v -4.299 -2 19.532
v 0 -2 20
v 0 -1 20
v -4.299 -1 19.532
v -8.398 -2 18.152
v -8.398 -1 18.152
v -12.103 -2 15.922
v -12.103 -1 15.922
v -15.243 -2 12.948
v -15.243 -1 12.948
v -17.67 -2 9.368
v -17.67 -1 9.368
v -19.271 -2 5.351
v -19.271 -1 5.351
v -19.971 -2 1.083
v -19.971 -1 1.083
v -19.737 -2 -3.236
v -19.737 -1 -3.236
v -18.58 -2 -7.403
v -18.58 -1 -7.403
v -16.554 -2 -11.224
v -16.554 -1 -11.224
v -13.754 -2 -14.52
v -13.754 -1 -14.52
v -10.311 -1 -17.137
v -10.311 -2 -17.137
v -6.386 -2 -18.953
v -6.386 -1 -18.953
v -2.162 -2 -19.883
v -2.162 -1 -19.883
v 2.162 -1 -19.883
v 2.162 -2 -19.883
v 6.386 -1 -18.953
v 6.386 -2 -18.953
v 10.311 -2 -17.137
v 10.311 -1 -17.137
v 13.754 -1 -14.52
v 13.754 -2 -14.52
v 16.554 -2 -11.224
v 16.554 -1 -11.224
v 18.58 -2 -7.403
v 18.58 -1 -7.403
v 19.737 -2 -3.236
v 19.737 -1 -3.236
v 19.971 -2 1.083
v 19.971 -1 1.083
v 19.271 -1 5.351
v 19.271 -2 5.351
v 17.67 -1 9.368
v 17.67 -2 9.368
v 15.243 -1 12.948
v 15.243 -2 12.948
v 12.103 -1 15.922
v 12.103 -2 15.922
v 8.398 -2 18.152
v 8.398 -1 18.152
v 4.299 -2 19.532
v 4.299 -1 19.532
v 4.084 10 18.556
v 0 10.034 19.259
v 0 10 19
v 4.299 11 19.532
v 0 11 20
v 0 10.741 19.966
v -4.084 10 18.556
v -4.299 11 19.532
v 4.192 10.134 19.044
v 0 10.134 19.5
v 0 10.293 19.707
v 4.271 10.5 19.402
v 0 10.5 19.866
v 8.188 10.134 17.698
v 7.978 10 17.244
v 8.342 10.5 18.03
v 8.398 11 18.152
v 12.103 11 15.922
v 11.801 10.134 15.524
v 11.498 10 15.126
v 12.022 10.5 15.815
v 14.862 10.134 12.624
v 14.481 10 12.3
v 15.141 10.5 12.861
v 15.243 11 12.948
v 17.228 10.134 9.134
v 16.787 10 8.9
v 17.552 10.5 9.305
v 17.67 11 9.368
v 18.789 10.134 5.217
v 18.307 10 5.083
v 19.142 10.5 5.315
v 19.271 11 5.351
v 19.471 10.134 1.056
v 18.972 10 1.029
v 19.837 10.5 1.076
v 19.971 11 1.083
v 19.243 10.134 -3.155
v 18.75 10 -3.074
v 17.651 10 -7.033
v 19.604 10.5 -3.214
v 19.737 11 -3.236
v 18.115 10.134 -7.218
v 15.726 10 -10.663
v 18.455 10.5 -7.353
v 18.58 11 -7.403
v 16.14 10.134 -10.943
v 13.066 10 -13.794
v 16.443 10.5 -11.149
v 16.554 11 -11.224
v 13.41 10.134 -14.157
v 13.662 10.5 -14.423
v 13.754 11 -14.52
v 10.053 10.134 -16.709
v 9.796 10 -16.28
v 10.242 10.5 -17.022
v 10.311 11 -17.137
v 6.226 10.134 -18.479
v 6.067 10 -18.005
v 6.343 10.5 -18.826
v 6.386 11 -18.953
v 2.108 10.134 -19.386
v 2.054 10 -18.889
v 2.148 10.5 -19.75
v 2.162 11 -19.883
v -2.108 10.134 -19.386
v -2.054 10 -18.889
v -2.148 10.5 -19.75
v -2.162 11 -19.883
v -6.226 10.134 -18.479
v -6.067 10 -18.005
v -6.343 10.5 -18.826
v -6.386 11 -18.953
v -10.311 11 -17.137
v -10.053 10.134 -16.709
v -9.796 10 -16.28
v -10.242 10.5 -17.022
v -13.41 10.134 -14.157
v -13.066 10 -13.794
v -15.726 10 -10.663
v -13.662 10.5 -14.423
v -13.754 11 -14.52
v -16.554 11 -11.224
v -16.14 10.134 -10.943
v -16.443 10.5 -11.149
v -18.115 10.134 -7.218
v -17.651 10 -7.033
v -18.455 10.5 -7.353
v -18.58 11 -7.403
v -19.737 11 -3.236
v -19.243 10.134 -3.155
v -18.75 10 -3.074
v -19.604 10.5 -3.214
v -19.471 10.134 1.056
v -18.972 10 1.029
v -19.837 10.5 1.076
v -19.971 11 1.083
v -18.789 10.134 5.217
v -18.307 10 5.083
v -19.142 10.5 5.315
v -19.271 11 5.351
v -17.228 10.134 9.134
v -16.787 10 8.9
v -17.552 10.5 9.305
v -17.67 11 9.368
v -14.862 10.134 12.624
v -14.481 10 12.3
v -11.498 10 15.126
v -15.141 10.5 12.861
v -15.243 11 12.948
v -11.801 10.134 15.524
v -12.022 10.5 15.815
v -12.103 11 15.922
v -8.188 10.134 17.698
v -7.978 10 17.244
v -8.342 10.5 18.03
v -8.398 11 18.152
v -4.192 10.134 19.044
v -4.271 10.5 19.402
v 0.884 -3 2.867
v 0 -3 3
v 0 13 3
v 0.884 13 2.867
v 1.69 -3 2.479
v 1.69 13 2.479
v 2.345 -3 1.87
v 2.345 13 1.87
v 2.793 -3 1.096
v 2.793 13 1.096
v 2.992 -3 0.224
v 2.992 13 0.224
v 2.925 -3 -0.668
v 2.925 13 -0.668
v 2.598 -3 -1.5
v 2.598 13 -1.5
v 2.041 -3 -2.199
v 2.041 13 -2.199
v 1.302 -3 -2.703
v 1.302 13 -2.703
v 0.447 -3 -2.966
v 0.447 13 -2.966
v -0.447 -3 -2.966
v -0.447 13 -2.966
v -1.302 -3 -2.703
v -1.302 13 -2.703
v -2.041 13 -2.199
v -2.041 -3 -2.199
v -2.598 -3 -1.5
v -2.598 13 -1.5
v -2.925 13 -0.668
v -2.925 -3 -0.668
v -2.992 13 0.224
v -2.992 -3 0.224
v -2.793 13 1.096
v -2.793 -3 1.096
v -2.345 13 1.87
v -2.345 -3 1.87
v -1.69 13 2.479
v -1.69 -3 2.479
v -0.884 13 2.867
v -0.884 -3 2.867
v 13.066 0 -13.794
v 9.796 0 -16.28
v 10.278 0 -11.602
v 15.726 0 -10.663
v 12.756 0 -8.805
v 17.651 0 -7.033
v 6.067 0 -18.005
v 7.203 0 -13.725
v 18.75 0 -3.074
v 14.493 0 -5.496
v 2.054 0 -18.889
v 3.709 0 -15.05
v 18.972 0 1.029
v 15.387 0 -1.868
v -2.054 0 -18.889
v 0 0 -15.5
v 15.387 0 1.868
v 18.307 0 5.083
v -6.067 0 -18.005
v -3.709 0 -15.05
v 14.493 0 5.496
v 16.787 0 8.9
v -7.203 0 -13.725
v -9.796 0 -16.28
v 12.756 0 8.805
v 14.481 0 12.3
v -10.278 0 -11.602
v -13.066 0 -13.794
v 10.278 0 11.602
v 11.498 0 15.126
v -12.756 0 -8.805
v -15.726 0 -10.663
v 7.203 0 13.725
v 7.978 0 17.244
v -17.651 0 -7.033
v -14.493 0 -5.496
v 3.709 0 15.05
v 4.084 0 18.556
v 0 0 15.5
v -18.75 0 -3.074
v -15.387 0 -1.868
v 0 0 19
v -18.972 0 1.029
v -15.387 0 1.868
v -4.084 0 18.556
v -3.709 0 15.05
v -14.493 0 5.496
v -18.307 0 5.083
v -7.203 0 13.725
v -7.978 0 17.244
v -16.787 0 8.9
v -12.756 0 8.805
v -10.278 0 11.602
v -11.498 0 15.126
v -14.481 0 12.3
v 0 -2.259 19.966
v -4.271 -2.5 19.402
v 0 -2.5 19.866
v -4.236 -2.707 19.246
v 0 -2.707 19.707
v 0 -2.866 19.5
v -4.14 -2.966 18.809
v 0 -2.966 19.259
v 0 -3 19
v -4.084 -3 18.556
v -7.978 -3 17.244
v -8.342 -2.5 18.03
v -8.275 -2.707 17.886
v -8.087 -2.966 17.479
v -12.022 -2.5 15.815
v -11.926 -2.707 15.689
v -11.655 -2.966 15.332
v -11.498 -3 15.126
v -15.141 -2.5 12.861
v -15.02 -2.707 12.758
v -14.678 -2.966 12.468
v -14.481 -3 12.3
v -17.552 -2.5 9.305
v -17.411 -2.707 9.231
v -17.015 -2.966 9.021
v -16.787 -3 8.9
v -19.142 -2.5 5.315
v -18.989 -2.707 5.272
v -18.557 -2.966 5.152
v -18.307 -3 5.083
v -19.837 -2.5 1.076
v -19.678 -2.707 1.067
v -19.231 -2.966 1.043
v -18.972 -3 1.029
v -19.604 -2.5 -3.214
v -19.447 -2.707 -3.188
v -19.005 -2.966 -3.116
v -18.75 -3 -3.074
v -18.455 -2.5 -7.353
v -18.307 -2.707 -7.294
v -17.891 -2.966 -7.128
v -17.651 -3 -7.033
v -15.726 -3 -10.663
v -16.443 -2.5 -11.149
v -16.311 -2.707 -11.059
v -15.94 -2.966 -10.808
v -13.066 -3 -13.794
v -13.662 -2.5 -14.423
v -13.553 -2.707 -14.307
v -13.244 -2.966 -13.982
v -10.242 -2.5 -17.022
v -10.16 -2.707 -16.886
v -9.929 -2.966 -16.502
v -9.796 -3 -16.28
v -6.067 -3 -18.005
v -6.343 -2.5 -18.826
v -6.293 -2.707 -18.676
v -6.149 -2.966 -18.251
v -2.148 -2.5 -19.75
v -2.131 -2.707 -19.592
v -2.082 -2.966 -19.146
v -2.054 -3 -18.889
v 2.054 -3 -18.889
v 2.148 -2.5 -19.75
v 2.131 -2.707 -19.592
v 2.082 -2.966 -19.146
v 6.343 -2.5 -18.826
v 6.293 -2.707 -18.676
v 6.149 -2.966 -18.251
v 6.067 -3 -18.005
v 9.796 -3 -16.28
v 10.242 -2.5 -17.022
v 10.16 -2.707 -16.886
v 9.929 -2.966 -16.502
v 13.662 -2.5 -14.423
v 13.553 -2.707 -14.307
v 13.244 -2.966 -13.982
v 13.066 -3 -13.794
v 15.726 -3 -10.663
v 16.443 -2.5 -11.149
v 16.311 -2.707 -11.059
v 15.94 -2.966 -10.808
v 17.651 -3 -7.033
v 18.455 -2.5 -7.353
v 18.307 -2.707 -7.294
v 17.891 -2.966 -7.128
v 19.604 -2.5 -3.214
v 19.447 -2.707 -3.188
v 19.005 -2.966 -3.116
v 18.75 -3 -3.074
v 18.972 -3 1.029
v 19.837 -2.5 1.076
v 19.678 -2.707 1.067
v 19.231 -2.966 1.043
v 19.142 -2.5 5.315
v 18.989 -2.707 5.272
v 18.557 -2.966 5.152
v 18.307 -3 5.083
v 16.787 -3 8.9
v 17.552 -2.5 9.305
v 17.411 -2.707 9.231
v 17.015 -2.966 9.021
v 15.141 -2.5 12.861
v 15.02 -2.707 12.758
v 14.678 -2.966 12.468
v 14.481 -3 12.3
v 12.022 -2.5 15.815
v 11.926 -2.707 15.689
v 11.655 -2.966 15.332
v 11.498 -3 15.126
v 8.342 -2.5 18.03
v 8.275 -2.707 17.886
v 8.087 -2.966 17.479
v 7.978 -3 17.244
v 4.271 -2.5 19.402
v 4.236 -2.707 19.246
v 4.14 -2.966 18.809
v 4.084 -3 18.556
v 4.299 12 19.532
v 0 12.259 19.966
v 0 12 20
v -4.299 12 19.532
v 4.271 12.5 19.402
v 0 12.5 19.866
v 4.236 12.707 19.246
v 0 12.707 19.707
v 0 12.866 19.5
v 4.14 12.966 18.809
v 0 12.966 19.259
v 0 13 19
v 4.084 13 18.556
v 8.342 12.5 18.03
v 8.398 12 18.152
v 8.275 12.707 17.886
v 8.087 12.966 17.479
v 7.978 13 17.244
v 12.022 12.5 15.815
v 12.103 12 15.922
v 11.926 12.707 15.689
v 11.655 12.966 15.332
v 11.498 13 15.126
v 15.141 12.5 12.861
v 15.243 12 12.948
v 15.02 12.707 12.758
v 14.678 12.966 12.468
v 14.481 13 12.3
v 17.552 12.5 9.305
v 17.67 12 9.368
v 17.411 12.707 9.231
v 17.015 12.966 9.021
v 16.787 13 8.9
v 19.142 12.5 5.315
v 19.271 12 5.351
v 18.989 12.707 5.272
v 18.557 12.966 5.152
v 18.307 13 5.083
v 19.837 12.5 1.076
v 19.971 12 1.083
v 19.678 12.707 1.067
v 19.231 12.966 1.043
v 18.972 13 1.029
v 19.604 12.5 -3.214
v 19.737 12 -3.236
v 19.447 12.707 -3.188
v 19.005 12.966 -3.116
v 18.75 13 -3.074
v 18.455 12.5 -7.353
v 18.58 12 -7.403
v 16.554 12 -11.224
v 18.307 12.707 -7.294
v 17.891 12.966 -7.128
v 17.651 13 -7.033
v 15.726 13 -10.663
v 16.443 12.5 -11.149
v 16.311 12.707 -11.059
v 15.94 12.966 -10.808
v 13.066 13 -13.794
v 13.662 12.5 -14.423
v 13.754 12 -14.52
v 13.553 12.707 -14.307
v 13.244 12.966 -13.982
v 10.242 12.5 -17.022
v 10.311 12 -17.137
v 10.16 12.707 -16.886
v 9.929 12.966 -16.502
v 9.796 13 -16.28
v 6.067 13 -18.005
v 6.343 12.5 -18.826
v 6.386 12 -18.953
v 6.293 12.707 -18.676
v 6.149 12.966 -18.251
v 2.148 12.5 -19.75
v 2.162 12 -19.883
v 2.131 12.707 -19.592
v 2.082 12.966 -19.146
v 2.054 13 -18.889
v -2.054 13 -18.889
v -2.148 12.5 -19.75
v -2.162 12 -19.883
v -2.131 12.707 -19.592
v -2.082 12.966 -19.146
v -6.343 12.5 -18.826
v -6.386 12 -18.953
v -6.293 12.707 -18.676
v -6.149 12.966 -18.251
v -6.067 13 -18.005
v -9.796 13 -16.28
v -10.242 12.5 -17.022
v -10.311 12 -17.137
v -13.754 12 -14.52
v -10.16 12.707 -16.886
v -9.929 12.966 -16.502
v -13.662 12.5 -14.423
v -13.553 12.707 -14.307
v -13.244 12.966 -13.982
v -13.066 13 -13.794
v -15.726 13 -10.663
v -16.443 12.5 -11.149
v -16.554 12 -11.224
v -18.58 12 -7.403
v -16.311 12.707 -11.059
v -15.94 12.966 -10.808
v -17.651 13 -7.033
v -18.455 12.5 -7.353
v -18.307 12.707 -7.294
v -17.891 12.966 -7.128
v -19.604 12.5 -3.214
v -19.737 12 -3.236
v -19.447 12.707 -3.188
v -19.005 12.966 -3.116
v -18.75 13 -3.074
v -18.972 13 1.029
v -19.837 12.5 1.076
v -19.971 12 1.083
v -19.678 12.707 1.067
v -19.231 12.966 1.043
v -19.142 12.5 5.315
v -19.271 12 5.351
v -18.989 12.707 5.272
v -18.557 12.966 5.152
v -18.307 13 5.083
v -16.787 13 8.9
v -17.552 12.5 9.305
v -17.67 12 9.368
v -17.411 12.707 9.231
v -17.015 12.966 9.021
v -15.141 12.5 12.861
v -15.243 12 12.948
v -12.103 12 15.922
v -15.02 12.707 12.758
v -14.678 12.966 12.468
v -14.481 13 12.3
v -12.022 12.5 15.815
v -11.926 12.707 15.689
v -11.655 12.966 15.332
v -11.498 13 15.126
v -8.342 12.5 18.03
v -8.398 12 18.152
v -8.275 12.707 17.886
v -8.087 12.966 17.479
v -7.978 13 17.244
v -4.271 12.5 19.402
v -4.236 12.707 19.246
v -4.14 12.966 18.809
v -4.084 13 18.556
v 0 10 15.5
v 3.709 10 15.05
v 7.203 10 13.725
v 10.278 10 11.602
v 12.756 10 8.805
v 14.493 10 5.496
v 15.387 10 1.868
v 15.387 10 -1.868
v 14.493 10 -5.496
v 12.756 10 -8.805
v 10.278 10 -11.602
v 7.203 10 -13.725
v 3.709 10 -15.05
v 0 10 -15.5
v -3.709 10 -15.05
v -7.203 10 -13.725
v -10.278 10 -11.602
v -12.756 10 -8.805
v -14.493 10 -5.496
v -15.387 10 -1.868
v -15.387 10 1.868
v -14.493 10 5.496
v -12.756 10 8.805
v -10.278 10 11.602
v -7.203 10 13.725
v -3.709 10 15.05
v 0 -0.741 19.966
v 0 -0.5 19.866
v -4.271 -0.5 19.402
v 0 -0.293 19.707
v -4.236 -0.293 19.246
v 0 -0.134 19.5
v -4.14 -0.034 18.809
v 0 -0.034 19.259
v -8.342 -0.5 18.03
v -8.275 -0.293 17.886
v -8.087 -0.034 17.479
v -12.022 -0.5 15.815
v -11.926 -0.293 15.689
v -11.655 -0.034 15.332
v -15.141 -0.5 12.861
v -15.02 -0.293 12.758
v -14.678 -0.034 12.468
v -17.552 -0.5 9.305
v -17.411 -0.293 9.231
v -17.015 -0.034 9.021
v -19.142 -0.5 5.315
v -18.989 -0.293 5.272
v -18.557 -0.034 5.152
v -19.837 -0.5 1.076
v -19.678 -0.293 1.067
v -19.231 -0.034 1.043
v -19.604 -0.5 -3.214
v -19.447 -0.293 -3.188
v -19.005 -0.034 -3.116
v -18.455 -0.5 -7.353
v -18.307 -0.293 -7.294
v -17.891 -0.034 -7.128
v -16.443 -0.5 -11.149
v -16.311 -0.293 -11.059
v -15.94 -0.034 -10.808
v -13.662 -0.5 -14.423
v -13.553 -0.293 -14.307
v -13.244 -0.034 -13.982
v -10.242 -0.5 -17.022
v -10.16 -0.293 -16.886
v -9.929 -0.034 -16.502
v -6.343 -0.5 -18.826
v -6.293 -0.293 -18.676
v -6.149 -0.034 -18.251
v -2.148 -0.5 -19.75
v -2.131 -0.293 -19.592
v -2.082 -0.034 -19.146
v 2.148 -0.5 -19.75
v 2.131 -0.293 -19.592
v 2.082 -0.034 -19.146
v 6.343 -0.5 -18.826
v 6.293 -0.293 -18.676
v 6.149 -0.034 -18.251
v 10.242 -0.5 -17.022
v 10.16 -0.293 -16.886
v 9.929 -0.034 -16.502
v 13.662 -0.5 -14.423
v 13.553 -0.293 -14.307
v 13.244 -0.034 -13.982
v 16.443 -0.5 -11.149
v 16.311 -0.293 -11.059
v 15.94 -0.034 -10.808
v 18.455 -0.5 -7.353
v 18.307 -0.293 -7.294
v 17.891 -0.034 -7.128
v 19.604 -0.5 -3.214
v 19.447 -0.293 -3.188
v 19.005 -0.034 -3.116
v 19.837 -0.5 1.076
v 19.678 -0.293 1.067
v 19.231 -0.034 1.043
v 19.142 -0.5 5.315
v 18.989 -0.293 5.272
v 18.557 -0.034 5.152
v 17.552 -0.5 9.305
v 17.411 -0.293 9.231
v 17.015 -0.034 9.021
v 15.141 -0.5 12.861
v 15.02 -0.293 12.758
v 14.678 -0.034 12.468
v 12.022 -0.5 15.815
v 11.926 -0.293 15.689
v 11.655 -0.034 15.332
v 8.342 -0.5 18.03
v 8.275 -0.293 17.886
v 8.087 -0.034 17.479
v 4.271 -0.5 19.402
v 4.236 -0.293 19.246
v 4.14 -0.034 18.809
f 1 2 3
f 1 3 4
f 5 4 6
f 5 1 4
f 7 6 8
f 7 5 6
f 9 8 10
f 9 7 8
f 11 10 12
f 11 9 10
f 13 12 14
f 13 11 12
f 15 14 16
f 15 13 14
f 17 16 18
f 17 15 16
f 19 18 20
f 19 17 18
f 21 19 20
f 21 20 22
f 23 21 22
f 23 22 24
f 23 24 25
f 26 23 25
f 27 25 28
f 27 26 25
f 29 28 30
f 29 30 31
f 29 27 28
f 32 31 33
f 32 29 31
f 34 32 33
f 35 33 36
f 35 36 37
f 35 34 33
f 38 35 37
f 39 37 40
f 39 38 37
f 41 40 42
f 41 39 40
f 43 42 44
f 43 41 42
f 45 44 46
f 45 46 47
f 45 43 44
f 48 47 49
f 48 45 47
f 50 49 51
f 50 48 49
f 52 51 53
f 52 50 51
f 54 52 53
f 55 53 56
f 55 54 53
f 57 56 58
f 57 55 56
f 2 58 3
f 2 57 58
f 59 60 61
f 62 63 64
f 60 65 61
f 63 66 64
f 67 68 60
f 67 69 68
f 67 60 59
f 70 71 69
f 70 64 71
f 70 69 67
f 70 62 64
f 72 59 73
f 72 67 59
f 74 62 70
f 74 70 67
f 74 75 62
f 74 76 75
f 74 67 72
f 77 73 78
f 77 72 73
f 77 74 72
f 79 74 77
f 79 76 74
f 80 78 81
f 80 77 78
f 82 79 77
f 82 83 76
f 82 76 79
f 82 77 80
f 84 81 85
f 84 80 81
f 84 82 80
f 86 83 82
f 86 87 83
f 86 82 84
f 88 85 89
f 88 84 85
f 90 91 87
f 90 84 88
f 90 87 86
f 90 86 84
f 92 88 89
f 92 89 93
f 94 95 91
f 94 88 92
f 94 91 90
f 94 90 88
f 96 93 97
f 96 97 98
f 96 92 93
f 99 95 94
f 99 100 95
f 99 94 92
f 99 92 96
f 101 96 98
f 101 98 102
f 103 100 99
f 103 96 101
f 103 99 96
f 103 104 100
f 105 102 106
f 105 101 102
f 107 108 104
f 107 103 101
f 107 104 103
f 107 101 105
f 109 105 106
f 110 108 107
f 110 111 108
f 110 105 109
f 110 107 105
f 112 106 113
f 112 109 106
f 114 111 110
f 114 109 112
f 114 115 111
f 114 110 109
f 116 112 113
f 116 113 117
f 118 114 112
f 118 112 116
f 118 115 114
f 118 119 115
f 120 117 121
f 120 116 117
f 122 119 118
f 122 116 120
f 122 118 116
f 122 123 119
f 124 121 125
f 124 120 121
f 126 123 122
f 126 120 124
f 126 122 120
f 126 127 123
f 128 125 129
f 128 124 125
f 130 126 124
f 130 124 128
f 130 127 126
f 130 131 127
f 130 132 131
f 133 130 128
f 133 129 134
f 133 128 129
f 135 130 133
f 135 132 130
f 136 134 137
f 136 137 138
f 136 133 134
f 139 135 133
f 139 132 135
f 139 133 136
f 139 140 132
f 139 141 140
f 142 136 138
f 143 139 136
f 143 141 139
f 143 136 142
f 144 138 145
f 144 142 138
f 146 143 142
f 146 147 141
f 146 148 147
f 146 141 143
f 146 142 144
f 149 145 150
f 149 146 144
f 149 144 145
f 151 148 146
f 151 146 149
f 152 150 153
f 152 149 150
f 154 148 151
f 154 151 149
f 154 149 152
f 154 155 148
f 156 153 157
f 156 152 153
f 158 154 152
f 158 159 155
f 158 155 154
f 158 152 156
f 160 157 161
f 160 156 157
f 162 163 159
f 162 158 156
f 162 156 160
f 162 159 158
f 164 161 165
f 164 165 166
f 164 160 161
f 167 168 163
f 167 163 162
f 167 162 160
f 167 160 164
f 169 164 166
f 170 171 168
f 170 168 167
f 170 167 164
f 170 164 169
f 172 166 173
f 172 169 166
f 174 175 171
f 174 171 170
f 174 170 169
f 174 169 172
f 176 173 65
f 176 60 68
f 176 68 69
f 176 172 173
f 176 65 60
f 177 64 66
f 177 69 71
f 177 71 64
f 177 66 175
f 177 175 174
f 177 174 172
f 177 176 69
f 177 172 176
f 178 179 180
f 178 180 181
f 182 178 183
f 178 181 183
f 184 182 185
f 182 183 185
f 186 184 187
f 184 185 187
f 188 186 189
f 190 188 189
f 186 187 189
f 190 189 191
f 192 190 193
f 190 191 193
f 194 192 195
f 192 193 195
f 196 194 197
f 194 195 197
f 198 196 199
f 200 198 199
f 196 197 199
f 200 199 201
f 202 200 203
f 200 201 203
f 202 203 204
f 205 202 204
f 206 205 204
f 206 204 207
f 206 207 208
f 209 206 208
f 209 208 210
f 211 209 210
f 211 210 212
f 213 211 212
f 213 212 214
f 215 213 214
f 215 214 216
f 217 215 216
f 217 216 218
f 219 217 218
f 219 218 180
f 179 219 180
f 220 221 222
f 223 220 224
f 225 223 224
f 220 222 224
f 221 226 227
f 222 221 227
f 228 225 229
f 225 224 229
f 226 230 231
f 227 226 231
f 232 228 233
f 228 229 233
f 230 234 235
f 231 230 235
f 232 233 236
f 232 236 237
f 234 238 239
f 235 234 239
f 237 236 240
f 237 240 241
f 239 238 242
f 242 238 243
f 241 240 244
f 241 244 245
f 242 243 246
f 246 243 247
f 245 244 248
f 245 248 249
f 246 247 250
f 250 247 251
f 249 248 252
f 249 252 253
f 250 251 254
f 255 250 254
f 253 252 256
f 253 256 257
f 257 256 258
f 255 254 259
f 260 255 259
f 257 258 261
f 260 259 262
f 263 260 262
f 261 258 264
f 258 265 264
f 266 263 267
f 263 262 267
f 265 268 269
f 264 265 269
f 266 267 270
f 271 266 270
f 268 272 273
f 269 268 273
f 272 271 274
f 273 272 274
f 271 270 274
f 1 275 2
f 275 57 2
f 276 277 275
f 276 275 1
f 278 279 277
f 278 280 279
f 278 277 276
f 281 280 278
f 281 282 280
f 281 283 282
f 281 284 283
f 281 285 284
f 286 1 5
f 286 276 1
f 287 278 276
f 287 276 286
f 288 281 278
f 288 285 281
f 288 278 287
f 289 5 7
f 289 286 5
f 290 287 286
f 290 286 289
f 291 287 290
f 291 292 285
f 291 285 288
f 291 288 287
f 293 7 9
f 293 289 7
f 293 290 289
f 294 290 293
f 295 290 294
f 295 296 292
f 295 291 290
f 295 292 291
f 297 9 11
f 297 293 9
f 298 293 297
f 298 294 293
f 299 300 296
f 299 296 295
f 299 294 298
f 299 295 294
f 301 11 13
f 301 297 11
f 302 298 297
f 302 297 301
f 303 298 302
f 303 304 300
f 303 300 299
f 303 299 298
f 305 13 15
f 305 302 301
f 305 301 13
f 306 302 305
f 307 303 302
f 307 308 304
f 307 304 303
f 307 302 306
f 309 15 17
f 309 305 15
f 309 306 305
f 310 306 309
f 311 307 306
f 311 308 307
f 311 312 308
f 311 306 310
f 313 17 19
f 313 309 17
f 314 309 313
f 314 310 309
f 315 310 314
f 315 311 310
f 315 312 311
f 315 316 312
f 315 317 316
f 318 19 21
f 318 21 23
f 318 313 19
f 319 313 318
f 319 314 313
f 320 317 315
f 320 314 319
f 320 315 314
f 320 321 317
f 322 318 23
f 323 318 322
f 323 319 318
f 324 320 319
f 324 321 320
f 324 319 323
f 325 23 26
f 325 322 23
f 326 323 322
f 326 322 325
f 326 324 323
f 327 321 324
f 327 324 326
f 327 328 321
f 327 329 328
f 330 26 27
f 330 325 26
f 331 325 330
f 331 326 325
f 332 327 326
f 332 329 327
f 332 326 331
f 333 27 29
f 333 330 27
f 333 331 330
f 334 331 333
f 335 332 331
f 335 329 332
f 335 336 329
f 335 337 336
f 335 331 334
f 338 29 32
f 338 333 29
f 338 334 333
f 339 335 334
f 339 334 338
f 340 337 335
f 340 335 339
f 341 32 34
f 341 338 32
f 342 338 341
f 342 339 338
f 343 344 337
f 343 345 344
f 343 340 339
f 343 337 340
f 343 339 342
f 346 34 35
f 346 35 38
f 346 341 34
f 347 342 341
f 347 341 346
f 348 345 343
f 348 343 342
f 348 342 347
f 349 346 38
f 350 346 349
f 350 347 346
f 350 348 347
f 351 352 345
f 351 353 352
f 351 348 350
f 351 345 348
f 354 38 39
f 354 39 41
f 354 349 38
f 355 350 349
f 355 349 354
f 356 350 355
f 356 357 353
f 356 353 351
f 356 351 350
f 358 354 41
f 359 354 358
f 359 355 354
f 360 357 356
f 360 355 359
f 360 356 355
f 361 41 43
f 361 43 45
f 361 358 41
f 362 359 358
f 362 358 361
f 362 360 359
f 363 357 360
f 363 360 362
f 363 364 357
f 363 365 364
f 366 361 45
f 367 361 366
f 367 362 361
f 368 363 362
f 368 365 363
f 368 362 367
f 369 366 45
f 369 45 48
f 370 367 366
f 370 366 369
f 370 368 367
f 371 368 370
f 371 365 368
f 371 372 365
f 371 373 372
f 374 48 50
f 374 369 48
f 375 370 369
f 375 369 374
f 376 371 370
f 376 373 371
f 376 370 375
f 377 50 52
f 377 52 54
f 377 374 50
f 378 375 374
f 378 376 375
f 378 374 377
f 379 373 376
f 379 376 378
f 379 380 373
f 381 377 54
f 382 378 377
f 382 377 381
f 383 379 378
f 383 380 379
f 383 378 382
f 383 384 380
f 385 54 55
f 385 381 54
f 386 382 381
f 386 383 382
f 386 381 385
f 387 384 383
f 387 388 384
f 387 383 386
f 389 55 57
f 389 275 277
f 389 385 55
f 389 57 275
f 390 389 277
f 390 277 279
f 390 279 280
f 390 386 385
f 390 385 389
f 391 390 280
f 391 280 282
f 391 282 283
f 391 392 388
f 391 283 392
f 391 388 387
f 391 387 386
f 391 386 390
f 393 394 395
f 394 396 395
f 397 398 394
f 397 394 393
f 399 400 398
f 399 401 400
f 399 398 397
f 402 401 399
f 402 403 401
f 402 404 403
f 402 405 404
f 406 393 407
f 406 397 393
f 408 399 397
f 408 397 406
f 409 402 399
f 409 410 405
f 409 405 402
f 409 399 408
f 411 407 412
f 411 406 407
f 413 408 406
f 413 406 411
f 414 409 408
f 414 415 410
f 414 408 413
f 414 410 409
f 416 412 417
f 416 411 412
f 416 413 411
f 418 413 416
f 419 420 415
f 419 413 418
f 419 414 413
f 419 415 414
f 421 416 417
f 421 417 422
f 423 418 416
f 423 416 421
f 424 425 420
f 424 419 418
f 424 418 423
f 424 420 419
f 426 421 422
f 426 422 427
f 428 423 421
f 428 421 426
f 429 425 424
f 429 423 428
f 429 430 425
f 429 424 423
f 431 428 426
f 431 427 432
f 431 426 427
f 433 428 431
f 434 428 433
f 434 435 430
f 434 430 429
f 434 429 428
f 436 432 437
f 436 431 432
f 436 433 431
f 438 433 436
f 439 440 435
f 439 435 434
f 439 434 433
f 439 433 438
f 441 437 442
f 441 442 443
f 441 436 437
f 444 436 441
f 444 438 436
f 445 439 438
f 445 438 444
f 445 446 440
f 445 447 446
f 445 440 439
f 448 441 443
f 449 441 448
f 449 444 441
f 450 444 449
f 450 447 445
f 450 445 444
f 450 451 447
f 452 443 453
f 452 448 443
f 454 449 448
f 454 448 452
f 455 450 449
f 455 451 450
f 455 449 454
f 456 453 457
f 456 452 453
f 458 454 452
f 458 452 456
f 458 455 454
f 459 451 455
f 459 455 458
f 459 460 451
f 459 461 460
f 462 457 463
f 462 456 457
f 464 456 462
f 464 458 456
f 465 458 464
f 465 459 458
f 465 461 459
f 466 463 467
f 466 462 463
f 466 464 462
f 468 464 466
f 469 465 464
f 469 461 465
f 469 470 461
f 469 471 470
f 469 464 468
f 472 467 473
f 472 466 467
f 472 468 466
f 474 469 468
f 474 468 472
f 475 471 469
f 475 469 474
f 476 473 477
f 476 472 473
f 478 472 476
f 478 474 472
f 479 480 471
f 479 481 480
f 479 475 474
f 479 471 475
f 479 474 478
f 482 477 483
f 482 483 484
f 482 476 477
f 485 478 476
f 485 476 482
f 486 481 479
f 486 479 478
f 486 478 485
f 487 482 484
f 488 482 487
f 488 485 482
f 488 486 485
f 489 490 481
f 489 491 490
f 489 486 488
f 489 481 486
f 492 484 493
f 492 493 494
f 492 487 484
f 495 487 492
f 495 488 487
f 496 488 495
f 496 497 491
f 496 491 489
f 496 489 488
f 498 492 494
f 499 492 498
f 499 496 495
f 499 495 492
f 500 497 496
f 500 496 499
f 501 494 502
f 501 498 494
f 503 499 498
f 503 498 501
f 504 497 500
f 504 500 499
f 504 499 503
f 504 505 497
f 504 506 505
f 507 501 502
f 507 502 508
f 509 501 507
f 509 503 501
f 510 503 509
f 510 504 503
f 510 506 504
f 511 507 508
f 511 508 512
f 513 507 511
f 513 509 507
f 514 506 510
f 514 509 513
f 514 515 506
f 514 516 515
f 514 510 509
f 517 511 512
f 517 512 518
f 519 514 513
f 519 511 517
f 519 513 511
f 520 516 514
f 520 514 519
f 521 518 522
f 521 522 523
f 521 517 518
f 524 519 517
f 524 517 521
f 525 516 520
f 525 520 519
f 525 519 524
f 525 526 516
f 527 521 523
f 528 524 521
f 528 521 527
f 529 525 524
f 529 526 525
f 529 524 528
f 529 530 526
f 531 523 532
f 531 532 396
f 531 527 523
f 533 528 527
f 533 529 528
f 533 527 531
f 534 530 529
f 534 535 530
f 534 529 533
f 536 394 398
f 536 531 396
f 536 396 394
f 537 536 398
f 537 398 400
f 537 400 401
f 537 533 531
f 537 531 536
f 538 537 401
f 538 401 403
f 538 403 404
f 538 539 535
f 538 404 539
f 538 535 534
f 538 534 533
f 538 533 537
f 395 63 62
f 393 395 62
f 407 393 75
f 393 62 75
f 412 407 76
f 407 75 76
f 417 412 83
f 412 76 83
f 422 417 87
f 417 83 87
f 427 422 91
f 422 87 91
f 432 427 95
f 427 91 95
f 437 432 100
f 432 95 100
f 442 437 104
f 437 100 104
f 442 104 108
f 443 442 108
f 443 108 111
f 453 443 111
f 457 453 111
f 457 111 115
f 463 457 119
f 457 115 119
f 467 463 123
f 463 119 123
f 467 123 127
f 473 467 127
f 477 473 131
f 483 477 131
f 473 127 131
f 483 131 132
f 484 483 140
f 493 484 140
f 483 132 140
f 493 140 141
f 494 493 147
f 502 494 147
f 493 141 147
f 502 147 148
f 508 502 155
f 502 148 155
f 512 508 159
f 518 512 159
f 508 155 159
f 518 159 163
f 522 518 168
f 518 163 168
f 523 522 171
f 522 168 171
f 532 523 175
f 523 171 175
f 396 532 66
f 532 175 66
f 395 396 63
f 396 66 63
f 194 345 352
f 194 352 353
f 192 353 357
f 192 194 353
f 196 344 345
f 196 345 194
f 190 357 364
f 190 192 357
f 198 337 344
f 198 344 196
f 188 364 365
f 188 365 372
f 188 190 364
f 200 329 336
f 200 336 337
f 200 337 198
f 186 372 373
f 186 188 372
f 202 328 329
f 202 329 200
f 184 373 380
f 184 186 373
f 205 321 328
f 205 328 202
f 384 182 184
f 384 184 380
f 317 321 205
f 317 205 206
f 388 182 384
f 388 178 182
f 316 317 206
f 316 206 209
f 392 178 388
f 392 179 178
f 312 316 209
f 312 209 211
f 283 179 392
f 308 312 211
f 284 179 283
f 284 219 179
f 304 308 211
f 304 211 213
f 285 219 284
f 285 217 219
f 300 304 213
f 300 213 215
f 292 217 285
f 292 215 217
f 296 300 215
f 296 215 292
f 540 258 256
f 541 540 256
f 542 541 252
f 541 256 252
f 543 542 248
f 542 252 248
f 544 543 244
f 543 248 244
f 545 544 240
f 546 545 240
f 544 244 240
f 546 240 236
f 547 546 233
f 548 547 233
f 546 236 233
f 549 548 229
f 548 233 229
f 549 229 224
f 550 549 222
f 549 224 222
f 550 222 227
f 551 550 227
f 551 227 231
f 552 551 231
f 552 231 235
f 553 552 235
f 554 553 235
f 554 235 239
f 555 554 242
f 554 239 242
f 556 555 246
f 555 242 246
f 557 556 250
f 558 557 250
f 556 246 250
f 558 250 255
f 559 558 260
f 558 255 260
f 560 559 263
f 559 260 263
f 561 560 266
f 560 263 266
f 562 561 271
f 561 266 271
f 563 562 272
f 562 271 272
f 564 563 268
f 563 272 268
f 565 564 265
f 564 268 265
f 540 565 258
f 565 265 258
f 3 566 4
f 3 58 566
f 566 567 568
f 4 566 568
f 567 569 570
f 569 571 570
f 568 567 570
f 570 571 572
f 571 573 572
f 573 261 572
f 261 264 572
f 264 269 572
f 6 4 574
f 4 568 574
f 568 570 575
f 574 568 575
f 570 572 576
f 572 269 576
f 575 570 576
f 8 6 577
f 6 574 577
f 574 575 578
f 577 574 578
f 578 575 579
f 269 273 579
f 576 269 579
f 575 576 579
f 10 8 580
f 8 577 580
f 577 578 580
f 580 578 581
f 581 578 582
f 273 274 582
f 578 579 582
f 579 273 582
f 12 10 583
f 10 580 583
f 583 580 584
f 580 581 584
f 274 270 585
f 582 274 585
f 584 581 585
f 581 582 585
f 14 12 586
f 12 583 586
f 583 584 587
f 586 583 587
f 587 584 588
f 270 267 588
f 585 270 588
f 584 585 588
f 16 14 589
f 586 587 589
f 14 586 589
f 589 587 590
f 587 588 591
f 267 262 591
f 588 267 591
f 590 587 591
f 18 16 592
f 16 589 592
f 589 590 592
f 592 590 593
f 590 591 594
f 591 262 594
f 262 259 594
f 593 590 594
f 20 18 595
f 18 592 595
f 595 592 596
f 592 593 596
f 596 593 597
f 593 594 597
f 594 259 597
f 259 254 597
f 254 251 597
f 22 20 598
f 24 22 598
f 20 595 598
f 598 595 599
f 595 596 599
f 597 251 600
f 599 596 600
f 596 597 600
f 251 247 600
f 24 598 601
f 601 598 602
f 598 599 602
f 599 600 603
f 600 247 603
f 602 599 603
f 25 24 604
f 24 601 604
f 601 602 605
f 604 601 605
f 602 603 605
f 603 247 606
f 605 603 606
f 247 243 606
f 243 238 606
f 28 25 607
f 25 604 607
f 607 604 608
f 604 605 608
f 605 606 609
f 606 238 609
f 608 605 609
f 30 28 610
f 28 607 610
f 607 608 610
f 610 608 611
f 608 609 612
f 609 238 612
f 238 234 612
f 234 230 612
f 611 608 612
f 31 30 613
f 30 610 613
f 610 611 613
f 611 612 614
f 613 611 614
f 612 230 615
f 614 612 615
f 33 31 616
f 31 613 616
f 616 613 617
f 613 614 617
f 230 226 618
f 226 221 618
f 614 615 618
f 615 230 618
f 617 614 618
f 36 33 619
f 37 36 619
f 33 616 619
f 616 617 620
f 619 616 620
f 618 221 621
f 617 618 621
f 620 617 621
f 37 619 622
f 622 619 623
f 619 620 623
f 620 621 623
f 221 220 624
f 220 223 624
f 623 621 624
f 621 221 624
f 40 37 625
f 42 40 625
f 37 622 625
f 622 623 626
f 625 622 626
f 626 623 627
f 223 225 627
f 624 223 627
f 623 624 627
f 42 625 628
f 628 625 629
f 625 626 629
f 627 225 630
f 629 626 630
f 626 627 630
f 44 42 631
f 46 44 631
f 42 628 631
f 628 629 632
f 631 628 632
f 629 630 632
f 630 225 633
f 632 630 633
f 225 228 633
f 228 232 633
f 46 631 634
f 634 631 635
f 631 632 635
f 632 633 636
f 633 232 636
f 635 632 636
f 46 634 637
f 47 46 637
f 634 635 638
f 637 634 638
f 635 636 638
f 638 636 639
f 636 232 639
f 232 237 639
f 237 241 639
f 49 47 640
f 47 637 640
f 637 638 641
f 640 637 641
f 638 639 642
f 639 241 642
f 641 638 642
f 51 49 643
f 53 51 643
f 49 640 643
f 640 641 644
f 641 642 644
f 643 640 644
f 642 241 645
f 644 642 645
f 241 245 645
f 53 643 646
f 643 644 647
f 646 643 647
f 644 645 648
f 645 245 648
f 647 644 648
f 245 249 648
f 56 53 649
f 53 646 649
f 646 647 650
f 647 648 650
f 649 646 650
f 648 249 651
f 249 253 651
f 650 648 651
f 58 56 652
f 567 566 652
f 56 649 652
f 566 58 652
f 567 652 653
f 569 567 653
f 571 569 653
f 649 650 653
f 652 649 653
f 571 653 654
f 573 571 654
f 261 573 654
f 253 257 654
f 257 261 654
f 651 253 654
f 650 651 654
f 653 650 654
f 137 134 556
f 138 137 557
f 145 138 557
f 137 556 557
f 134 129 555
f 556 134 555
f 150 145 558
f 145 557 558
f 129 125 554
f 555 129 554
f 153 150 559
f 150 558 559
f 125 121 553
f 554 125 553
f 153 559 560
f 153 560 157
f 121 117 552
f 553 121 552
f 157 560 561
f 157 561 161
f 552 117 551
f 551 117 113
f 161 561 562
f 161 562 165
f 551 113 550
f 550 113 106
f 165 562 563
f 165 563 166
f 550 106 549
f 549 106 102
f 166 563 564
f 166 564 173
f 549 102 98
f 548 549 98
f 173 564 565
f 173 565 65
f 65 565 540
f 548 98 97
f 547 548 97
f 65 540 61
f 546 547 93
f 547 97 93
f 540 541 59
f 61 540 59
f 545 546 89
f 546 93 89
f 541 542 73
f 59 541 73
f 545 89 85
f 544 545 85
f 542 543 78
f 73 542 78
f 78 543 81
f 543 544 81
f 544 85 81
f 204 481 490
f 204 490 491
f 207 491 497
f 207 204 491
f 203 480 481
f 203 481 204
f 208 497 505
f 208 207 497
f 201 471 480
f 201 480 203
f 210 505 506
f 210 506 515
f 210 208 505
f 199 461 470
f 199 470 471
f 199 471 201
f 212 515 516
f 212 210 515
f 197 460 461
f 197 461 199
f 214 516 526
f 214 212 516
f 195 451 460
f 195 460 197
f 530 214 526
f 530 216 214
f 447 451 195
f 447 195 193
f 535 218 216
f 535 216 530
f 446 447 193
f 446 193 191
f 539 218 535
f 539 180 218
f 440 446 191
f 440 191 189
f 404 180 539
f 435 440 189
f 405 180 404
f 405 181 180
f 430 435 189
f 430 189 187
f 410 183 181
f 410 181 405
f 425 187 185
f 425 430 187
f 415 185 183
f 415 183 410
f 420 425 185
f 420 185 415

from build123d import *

# Parameters (mm, degrees)
SKETCH_1_R          = 15.5
EXTRUDE_1_DEPTH     = 10
SKETCH_2_R          = 20
EXTRUDE_2_DEPTH     = 3
EXTRUDE_START       = 3
SKETCH_3_R          = 20
EXTRUDE_3_DEPTH     = 3
FILLET_2_R          = 1
SKETCH_4_R          = 3
CUT_EXTRUDE_1_DEPTH = 33.49615368


with BuildPart() as part:
    # 草图1 → 凸台-拉伸1 (new body)
    with BuildSketch(Plane(origin=(0, 0, 0), x_dir=(1, 0, 0), z_dir=(0, 1, 0))):
        with Locations(Location((0, 0, 0), (0, 0, 270))):
            Circle(SKETCH_1_R)
    extrude(amount=EXTRUDE_1_DEPTH)

    # 草图2 → 凸台-拉伸2 (add)
    with BuildSketch(Plane(origin=(0, 10, 0), x_dir=(1, 0, 0), z_dir=(0, 1, 0))):
        with Locations(Location((0, 0, 0), (0, 0, 270))):
            Circle(SKETCH_2_R)
    extrude(amount=EXTRUDE_2_DEPTH)

    # 草图3 → 凸台-拉伸3 (add)
    with BuildSketch(Plane.XZ.offset(EXTRUDE_START)):
        with Locations(Location((0, 0, 0), (0, 0, 90))):
            Circle(SKETCH_3_R)
    extrude(amount=-EXTRUDE_3_DEPTH)

    # 圆角2
    fillet_2_edges = [part.edges().sort_by_distance(p)[0] for p in [
        (0, -3, -20),
        (0, 10, -20),
        (0, 13, -20),
        (0, 0, -20),
    ]]
    fillet(fillet_2_edges, radius=FILLET_2_R)

    # 草图4 → 切除-拉伸1 (cut, through all)
    with BuildSketch(Plane(origin=(0, 13, 0), x_dir=(1, 0, 0), z_dir=(0, 1, 0))):
        with Locations(Location((0, 0, 0), (0, 0, 270))):
            Circle(SKETCH_4_R)
    extrude(amount=-CUT_EXTRUDE_1_DEPTH, mode=Mode.SUBTRACT)


solid = part.part
